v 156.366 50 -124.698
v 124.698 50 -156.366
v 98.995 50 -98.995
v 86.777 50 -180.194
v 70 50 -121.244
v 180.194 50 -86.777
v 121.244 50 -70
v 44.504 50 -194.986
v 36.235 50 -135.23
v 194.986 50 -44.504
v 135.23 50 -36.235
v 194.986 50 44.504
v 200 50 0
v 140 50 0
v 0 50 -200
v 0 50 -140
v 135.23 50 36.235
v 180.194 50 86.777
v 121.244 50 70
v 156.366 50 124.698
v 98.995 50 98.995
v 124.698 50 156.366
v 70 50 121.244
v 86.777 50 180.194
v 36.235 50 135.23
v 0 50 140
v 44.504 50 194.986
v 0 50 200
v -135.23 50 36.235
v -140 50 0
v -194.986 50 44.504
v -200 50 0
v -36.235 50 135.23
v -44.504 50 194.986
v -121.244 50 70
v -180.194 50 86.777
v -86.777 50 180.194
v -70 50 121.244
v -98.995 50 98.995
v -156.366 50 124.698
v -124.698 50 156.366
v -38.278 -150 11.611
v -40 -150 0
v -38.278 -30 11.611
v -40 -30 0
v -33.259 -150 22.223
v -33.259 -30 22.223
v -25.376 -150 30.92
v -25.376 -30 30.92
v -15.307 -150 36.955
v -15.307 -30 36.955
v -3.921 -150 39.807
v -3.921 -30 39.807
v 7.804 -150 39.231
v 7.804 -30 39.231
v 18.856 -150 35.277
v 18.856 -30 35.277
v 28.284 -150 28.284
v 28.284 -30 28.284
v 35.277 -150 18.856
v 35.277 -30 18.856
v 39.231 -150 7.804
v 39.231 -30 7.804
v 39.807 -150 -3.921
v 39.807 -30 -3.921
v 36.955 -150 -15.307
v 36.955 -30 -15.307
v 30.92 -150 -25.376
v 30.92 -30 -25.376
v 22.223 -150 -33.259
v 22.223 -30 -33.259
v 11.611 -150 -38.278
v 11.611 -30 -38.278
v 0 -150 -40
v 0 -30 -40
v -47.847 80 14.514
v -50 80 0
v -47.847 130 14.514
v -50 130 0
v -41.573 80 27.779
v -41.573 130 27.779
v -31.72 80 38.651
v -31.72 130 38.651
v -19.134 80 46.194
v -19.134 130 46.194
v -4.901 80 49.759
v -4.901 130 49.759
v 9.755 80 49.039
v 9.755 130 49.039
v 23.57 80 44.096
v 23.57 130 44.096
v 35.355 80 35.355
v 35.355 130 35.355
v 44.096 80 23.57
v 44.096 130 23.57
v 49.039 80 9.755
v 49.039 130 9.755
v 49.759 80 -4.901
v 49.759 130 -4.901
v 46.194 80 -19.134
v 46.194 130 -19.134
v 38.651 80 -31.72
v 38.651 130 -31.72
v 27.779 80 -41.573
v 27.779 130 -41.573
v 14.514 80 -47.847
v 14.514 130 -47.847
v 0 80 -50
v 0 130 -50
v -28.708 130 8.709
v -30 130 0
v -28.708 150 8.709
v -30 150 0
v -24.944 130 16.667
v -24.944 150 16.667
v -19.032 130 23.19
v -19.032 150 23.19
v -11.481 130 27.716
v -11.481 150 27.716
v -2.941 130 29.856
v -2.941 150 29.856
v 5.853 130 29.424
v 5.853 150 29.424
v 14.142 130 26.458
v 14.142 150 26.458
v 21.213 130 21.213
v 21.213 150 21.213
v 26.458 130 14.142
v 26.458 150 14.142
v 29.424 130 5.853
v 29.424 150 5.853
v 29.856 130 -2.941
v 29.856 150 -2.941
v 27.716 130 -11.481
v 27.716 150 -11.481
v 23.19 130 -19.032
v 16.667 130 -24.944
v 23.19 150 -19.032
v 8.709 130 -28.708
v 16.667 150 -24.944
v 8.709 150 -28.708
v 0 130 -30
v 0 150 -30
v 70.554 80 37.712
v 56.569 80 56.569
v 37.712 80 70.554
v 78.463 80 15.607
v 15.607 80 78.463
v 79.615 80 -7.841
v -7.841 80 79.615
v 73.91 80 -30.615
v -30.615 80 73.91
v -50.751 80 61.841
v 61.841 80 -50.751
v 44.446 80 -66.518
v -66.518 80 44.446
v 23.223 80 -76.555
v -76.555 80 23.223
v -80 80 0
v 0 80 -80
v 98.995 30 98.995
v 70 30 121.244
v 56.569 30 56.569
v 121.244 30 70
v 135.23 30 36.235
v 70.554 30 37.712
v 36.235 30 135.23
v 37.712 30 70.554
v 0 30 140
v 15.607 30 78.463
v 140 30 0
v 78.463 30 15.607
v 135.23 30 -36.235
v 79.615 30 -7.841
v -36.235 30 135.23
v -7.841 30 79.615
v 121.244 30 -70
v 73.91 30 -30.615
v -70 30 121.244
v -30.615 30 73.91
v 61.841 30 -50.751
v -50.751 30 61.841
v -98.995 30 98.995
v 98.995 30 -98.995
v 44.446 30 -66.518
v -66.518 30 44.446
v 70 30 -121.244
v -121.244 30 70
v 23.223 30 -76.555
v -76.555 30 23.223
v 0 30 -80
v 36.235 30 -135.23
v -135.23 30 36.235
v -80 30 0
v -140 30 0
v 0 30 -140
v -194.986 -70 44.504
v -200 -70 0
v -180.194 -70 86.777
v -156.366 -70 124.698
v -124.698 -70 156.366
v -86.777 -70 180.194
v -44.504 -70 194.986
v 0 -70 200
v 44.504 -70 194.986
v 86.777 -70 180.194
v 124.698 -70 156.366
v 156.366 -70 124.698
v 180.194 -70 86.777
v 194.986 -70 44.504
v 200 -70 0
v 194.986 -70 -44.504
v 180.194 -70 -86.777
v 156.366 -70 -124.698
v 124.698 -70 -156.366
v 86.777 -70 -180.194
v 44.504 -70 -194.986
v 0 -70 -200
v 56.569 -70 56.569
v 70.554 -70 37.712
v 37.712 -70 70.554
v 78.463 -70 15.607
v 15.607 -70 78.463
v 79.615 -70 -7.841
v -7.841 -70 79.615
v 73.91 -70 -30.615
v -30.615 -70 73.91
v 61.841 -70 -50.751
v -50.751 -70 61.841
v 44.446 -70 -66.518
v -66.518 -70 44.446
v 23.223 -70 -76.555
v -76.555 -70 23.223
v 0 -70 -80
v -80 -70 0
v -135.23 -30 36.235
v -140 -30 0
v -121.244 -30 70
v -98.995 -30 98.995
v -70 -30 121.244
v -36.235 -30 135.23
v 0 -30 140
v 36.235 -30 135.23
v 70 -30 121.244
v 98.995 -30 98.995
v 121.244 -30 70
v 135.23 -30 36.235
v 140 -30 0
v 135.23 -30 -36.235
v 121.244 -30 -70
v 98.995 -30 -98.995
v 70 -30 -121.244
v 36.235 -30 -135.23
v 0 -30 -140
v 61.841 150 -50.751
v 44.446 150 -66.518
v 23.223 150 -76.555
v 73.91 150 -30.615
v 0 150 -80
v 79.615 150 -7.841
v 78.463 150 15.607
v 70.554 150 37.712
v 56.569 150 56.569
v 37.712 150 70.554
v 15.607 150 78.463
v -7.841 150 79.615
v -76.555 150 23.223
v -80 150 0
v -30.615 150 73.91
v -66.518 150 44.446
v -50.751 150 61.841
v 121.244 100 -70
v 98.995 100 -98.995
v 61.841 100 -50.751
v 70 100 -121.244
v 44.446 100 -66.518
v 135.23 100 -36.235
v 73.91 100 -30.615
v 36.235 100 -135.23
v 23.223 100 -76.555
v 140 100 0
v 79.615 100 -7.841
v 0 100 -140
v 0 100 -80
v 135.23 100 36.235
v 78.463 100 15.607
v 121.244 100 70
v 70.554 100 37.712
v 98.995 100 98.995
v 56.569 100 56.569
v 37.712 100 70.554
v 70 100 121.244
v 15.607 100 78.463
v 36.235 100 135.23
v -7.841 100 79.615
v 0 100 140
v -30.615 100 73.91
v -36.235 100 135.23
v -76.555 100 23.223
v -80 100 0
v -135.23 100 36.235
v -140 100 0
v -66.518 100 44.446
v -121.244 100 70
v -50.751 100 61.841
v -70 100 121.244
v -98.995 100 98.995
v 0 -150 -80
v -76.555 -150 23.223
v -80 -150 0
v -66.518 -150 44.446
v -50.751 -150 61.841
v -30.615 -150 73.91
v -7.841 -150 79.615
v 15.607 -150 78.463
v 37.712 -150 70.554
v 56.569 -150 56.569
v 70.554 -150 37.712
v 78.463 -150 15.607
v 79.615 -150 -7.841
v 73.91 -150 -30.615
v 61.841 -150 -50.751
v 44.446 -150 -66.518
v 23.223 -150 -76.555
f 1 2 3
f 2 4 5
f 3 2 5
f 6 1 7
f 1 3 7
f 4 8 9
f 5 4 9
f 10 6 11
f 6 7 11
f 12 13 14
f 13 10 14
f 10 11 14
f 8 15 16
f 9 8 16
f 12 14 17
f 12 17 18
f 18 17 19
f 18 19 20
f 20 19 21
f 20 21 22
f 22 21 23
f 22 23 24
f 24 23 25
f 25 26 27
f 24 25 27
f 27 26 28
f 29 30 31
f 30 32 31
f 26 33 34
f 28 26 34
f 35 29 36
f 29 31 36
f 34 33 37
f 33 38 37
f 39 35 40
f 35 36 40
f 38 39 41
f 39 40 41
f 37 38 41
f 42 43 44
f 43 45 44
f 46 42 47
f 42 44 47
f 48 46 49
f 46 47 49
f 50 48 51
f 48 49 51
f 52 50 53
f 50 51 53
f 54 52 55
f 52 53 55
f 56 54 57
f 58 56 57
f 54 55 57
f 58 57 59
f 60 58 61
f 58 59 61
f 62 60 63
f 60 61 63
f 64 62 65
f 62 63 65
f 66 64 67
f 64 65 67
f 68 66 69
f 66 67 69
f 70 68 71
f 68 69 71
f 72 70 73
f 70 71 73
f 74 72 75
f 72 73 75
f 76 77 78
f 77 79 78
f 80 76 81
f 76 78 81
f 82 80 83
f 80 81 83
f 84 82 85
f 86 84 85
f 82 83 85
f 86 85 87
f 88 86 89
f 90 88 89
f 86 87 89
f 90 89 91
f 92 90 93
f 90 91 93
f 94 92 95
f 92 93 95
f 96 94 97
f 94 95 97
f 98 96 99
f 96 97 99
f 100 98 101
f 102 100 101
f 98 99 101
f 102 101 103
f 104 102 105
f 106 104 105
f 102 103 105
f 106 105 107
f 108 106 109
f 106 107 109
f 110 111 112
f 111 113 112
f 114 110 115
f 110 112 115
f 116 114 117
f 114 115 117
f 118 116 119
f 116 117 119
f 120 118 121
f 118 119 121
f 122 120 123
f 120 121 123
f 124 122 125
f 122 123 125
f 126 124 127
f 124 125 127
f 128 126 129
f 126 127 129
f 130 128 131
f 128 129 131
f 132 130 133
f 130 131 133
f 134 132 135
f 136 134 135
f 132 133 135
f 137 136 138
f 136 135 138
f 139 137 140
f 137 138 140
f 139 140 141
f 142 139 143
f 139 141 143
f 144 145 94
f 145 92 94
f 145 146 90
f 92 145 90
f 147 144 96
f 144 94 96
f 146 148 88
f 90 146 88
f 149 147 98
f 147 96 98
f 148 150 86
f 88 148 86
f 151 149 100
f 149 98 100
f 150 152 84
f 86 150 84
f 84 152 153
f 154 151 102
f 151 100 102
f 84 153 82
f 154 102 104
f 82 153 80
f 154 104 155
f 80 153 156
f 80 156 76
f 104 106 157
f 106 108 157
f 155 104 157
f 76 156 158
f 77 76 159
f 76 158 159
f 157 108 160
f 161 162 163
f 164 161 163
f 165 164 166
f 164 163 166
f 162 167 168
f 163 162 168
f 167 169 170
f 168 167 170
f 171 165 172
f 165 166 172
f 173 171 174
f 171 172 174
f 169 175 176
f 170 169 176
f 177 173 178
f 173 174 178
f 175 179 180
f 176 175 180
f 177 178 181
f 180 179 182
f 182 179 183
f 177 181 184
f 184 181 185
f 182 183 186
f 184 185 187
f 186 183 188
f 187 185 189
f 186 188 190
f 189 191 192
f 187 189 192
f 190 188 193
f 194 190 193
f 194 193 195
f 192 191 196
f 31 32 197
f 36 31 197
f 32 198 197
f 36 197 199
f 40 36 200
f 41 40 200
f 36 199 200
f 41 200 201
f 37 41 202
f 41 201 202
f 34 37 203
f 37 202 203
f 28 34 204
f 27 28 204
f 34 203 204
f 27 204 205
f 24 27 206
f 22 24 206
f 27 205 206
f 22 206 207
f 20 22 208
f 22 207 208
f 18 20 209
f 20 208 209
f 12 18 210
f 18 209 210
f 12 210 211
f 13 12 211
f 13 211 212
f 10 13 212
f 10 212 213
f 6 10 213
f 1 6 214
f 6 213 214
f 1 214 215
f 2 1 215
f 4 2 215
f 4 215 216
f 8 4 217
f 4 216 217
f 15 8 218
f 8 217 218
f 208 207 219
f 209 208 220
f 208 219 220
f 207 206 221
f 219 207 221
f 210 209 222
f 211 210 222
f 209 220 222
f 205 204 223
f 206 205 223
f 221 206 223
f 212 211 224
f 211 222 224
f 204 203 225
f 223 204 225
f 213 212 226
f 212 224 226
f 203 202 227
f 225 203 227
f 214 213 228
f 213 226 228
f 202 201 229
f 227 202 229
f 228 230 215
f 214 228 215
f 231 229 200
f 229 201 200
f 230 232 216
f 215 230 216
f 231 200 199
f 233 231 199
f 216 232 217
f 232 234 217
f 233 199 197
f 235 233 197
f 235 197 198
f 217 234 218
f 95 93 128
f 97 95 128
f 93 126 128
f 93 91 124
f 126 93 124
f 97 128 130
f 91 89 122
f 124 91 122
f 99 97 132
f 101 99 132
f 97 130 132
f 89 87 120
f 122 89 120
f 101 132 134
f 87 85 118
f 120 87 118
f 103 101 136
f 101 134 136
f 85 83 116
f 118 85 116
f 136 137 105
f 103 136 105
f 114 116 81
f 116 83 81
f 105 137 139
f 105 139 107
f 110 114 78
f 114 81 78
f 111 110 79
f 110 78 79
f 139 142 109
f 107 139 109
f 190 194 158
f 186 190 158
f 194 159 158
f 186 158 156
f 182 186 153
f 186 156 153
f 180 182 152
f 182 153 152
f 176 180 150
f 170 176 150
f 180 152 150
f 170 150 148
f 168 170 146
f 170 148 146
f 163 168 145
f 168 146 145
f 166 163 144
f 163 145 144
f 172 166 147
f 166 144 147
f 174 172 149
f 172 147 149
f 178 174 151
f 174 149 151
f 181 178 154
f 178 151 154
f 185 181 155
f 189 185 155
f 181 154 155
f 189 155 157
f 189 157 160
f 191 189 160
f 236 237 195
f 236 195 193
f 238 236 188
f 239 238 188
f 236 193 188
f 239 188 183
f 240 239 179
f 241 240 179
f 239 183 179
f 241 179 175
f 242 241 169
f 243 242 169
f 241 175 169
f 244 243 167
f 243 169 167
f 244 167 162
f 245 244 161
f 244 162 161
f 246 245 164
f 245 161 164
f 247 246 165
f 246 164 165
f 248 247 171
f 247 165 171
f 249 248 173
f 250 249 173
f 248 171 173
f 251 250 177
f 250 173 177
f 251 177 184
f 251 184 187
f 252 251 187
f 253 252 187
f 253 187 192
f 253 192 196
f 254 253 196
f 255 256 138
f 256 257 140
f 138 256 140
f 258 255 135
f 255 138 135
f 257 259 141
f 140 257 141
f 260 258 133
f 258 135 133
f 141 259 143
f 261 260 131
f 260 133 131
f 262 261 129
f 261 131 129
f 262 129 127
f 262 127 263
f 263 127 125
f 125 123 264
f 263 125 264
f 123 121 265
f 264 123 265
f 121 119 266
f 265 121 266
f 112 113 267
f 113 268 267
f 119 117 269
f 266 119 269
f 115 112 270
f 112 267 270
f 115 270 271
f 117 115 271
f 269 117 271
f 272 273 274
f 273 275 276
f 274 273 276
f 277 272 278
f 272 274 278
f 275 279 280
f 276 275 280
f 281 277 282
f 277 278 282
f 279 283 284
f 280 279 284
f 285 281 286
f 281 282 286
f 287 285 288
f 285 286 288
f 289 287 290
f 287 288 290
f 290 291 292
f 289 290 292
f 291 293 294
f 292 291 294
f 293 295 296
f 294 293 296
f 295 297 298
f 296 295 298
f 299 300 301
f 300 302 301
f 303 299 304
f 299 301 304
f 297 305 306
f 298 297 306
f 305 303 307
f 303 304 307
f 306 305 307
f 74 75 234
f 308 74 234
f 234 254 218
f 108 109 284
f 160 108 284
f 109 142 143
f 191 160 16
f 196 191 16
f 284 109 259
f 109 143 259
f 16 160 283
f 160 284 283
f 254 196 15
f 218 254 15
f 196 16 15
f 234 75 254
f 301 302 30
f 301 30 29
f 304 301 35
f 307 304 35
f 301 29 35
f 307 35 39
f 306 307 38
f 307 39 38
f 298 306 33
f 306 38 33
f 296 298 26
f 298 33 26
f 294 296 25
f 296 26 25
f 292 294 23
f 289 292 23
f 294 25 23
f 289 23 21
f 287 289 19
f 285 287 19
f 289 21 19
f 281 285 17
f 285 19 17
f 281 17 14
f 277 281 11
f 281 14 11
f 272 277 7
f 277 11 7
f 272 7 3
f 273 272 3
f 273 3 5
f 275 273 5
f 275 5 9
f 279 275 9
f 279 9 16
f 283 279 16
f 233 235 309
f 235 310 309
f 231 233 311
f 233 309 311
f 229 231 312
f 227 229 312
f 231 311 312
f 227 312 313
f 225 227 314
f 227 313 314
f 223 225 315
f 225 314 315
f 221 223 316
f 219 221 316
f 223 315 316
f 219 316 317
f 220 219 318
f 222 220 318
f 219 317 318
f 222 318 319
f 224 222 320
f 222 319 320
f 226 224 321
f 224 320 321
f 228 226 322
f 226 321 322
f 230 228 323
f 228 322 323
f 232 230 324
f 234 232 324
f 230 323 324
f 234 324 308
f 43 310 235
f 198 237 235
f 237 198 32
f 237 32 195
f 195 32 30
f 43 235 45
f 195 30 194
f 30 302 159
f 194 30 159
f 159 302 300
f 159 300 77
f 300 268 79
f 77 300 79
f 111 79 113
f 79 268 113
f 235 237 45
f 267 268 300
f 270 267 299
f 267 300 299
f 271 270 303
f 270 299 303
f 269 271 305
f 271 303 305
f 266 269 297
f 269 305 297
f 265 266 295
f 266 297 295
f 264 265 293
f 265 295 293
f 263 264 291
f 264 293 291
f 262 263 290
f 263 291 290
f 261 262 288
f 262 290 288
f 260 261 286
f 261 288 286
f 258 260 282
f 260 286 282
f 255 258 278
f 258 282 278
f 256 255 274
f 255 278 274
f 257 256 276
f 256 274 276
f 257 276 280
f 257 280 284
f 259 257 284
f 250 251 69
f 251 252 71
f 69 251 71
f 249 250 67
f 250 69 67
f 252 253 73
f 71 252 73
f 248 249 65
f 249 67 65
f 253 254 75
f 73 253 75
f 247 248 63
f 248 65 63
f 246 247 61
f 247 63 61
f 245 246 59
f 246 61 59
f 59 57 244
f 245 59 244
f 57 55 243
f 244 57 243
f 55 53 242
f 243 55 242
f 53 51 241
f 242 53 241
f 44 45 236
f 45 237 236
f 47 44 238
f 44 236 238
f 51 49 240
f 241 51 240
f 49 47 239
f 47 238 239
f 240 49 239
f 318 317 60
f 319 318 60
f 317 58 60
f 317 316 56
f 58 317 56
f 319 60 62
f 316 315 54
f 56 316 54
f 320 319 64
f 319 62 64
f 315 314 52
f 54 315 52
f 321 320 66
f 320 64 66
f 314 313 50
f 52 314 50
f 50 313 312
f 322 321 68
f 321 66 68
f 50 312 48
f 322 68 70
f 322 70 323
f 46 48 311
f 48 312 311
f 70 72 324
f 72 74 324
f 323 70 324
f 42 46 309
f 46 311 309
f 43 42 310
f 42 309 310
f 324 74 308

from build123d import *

# Parameters (mm, degrees)
SKETCH2_W          = 278.036516336
SKETCH2_H          = 207.466179174
CUT_EXTRUDE1_DEPTH = 413.310562562


with BuildPart() as part:
    # Sketch1 → Revolve1 (revolve)
    with BuildSketch(Plane.XY, mode=Mode.PRIVATE) as revolve1_sk:
        Polygon((-30, 150), (-80, 150), (-80, 100), (-140, 100), (-140, 50), (-200, 50), (-200, -70), (-80, -70), (-80, -150), (-40, -150), (-40, -30), (-140, -30), (-140, 30), (-80, 30), (-80, 80), (-50, 80), (-50, 130), (-30, 130), align=None)
    revolve(revolve1_sk.sketch.rotate(Axis((0, -150, 0), (0, 1, 0)), 270), axis=Axis((0, -150, 0), (0, 1, 0)))

    # Sketch2 → Cut-Extrude1 (cut, through all)
    with BuildSketch(Plane(origin=(0, 150, 0), x_dir=(1, 0, 0), z_dir=(0, 1, 0))):
        with Locations((-139.018258168, 103.733089587)):
            Rectangle(SKETCH2_W, SKETCH2_H)
    extrude(amount=-CUT_EXTRUDE1_DEPTH, mode=Mode.SUBTRACT)


solid = part.part
